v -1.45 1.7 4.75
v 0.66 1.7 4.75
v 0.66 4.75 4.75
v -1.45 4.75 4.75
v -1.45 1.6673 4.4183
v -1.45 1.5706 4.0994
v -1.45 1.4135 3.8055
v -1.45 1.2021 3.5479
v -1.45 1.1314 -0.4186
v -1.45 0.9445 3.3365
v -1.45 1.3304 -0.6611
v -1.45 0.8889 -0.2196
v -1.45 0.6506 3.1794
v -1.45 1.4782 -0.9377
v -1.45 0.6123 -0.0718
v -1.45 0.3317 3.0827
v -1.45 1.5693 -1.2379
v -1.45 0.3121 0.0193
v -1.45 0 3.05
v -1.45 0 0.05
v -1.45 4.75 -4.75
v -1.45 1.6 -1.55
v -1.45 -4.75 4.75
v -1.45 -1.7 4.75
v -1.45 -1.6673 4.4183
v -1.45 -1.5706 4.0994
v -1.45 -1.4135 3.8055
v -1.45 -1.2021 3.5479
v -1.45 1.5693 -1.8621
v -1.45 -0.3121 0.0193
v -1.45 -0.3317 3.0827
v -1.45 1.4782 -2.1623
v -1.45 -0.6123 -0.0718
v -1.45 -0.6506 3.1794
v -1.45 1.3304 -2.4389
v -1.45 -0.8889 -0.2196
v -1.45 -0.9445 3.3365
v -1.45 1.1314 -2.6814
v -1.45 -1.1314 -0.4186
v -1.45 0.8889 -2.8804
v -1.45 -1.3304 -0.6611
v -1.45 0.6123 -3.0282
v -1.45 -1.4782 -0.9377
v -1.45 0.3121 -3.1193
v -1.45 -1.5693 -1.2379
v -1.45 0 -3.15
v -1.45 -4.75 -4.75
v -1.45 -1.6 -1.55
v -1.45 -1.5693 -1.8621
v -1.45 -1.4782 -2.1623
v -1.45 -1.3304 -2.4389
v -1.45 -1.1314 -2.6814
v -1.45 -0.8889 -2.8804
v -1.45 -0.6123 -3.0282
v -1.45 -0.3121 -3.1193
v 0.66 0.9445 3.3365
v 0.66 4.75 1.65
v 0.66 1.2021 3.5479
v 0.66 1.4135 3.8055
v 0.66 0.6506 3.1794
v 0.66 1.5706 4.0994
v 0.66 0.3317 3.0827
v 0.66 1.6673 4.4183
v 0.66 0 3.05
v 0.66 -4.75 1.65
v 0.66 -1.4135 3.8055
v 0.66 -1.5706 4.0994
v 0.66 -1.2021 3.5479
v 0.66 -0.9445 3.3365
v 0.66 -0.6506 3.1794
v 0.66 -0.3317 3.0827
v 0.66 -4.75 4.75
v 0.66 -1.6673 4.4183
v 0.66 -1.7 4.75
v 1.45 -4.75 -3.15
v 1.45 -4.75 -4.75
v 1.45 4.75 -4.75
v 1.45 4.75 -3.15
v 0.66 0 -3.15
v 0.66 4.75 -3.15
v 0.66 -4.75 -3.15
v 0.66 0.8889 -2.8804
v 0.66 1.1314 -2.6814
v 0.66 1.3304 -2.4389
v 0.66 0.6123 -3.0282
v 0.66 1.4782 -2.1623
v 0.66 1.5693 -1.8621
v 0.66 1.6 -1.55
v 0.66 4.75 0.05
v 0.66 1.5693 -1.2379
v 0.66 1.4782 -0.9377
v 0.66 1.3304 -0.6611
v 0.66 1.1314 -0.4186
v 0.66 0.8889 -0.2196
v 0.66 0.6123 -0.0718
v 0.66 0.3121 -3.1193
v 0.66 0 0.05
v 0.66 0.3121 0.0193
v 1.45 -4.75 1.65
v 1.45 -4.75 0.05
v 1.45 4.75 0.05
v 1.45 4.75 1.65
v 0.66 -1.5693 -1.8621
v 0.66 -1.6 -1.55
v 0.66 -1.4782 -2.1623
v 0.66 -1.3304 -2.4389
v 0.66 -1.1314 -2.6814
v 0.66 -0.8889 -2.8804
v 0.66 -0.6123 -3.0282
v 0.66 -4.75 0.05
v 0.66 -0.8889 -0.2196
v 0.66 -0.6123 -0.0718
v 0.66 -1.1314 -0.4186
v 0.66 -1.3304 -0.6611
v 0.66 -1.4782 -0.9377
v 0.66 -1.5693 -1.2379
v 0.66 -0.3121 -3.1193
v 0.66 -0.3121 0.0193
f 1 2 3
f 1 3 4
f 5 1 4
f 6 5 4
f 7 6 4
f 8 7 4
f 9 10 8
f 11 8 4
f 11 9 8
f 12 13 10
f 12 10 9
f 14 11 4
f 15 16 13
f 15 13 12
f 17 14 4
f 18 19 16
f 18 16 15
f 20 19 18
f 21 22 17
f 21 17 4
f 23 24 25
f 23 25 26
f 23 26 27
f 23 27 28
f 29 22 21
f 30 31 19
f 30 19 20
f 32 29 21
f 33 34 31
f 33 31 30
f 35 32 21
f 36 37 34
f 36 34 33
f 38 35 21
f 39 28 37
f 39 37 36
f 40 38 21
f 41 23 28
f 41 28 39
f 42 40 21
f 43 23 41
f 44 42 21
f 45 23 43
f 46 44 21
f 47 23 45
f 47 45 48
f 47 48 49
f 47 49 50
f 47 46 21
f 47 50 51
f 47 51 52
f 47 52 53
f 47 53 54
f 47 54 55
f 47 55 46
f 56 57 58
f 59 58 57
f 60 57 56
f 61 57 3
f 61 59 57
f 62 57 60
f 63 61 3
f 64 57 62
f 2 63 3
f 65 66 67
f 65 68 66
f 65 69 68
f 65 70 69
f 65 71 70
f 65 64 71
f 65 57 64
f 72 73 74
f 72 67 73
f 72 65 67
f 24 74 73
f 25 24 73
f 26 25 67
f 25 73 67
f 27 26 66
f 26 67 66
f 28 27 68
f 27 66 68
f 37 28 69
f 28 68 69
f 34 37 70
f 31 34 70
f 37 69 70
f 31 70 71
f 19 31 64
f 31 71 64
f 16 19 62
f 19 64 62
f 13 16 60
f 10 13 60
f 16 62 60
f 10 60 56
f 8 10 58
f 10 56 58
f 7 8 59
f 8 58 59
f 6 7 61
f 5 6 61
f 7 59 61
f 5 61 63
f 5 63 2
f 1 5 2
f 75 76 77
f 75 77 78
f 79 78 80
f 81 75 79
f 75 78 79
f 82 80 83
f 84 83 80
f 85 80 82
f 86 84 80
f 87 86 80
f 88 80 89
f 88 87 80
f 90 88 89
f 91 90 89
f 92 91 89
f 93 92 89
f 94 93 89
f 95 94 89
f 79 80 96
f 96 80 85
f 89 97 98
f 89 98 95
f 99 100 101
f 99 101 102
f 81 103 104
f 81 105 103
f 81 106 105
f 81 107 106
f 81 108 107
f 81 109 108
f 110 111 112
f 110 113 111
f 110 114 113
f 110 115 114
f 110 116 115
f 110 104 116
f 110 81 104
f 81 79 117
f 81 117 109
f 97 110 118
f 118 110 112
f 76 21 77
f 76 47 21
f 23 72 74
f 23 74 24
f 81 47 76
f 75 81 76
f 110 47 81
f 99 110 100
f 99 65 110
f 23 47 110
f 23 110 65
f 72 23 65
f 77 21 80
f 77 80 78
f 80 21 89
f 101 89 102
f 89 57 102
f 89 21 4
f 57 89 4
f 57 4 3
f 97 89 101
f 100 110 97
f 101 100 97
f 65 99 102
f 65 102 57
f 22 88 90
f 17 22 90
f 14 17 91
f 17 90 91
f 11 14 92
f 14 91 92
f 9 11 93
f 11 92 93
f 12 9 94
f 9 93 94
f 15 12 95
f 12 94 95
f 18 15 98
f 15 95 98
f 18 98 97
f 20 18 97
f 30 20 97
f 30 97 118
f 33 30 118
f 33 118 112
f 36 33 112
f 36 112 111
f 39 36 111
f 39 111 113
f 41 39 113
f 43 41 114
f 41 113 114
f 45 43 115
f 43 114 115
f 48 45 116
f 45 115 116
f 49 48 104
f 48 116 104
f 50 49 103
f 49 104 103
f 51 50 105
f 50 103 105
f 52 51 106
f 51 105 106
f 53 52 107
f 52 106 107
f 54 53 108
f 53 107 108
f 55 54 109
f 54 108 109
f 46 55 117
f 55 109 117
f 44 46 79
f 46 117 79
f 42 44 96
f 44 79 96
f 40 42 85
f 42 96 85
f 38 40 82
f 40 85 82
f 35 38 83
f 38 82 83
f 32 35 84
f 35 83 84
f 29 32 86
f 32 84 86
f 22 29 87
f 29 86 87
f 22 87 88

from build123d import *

# Parameters (mm, degrees)
F1_DEPTH = 4.75
F2_R     = 1.7
F3_DEPTH = 2.111
F4_R     = 1.6
F5_DEPTH = 2.111


with BuildPart() as f1:
    # F0 (on Front) → F1 (new body, symmetric)
    with BuildSketch(Plane.XZ):
        Polygon((-1.45, -4.75), (1.45, -4.75), (1.45, -3.15), (0.66, -3.15), (0.66, 0.05), (1.45, 0.05), (1.45, 1.65), (0.66, 1.65), (0.66, 4.75), (-1.45, 4.75), align=None)
    extrude(amount=F1_DEPTH, both=True)

    # F2 (on face) → F3 (cut, through all)
    with BuildSketch(Plane.YZ.offset(0.66)):
        with Locations((0, 4.75)):
            Circle(F2_R)
    extrude(amount=-F3_DEPTH, mode=Mode.SUBTRACT)

    # F4 (on face) → F5 (cut, through all)
    with BuildSketch(Plane.YZ.offset(0.66)):
        with Locations((0, -1.55)):
            Circle(F4_R)
    extrude(amount=-F5_DEPTH, mode=Mode.SUBTRACT)


solid = f1.part
